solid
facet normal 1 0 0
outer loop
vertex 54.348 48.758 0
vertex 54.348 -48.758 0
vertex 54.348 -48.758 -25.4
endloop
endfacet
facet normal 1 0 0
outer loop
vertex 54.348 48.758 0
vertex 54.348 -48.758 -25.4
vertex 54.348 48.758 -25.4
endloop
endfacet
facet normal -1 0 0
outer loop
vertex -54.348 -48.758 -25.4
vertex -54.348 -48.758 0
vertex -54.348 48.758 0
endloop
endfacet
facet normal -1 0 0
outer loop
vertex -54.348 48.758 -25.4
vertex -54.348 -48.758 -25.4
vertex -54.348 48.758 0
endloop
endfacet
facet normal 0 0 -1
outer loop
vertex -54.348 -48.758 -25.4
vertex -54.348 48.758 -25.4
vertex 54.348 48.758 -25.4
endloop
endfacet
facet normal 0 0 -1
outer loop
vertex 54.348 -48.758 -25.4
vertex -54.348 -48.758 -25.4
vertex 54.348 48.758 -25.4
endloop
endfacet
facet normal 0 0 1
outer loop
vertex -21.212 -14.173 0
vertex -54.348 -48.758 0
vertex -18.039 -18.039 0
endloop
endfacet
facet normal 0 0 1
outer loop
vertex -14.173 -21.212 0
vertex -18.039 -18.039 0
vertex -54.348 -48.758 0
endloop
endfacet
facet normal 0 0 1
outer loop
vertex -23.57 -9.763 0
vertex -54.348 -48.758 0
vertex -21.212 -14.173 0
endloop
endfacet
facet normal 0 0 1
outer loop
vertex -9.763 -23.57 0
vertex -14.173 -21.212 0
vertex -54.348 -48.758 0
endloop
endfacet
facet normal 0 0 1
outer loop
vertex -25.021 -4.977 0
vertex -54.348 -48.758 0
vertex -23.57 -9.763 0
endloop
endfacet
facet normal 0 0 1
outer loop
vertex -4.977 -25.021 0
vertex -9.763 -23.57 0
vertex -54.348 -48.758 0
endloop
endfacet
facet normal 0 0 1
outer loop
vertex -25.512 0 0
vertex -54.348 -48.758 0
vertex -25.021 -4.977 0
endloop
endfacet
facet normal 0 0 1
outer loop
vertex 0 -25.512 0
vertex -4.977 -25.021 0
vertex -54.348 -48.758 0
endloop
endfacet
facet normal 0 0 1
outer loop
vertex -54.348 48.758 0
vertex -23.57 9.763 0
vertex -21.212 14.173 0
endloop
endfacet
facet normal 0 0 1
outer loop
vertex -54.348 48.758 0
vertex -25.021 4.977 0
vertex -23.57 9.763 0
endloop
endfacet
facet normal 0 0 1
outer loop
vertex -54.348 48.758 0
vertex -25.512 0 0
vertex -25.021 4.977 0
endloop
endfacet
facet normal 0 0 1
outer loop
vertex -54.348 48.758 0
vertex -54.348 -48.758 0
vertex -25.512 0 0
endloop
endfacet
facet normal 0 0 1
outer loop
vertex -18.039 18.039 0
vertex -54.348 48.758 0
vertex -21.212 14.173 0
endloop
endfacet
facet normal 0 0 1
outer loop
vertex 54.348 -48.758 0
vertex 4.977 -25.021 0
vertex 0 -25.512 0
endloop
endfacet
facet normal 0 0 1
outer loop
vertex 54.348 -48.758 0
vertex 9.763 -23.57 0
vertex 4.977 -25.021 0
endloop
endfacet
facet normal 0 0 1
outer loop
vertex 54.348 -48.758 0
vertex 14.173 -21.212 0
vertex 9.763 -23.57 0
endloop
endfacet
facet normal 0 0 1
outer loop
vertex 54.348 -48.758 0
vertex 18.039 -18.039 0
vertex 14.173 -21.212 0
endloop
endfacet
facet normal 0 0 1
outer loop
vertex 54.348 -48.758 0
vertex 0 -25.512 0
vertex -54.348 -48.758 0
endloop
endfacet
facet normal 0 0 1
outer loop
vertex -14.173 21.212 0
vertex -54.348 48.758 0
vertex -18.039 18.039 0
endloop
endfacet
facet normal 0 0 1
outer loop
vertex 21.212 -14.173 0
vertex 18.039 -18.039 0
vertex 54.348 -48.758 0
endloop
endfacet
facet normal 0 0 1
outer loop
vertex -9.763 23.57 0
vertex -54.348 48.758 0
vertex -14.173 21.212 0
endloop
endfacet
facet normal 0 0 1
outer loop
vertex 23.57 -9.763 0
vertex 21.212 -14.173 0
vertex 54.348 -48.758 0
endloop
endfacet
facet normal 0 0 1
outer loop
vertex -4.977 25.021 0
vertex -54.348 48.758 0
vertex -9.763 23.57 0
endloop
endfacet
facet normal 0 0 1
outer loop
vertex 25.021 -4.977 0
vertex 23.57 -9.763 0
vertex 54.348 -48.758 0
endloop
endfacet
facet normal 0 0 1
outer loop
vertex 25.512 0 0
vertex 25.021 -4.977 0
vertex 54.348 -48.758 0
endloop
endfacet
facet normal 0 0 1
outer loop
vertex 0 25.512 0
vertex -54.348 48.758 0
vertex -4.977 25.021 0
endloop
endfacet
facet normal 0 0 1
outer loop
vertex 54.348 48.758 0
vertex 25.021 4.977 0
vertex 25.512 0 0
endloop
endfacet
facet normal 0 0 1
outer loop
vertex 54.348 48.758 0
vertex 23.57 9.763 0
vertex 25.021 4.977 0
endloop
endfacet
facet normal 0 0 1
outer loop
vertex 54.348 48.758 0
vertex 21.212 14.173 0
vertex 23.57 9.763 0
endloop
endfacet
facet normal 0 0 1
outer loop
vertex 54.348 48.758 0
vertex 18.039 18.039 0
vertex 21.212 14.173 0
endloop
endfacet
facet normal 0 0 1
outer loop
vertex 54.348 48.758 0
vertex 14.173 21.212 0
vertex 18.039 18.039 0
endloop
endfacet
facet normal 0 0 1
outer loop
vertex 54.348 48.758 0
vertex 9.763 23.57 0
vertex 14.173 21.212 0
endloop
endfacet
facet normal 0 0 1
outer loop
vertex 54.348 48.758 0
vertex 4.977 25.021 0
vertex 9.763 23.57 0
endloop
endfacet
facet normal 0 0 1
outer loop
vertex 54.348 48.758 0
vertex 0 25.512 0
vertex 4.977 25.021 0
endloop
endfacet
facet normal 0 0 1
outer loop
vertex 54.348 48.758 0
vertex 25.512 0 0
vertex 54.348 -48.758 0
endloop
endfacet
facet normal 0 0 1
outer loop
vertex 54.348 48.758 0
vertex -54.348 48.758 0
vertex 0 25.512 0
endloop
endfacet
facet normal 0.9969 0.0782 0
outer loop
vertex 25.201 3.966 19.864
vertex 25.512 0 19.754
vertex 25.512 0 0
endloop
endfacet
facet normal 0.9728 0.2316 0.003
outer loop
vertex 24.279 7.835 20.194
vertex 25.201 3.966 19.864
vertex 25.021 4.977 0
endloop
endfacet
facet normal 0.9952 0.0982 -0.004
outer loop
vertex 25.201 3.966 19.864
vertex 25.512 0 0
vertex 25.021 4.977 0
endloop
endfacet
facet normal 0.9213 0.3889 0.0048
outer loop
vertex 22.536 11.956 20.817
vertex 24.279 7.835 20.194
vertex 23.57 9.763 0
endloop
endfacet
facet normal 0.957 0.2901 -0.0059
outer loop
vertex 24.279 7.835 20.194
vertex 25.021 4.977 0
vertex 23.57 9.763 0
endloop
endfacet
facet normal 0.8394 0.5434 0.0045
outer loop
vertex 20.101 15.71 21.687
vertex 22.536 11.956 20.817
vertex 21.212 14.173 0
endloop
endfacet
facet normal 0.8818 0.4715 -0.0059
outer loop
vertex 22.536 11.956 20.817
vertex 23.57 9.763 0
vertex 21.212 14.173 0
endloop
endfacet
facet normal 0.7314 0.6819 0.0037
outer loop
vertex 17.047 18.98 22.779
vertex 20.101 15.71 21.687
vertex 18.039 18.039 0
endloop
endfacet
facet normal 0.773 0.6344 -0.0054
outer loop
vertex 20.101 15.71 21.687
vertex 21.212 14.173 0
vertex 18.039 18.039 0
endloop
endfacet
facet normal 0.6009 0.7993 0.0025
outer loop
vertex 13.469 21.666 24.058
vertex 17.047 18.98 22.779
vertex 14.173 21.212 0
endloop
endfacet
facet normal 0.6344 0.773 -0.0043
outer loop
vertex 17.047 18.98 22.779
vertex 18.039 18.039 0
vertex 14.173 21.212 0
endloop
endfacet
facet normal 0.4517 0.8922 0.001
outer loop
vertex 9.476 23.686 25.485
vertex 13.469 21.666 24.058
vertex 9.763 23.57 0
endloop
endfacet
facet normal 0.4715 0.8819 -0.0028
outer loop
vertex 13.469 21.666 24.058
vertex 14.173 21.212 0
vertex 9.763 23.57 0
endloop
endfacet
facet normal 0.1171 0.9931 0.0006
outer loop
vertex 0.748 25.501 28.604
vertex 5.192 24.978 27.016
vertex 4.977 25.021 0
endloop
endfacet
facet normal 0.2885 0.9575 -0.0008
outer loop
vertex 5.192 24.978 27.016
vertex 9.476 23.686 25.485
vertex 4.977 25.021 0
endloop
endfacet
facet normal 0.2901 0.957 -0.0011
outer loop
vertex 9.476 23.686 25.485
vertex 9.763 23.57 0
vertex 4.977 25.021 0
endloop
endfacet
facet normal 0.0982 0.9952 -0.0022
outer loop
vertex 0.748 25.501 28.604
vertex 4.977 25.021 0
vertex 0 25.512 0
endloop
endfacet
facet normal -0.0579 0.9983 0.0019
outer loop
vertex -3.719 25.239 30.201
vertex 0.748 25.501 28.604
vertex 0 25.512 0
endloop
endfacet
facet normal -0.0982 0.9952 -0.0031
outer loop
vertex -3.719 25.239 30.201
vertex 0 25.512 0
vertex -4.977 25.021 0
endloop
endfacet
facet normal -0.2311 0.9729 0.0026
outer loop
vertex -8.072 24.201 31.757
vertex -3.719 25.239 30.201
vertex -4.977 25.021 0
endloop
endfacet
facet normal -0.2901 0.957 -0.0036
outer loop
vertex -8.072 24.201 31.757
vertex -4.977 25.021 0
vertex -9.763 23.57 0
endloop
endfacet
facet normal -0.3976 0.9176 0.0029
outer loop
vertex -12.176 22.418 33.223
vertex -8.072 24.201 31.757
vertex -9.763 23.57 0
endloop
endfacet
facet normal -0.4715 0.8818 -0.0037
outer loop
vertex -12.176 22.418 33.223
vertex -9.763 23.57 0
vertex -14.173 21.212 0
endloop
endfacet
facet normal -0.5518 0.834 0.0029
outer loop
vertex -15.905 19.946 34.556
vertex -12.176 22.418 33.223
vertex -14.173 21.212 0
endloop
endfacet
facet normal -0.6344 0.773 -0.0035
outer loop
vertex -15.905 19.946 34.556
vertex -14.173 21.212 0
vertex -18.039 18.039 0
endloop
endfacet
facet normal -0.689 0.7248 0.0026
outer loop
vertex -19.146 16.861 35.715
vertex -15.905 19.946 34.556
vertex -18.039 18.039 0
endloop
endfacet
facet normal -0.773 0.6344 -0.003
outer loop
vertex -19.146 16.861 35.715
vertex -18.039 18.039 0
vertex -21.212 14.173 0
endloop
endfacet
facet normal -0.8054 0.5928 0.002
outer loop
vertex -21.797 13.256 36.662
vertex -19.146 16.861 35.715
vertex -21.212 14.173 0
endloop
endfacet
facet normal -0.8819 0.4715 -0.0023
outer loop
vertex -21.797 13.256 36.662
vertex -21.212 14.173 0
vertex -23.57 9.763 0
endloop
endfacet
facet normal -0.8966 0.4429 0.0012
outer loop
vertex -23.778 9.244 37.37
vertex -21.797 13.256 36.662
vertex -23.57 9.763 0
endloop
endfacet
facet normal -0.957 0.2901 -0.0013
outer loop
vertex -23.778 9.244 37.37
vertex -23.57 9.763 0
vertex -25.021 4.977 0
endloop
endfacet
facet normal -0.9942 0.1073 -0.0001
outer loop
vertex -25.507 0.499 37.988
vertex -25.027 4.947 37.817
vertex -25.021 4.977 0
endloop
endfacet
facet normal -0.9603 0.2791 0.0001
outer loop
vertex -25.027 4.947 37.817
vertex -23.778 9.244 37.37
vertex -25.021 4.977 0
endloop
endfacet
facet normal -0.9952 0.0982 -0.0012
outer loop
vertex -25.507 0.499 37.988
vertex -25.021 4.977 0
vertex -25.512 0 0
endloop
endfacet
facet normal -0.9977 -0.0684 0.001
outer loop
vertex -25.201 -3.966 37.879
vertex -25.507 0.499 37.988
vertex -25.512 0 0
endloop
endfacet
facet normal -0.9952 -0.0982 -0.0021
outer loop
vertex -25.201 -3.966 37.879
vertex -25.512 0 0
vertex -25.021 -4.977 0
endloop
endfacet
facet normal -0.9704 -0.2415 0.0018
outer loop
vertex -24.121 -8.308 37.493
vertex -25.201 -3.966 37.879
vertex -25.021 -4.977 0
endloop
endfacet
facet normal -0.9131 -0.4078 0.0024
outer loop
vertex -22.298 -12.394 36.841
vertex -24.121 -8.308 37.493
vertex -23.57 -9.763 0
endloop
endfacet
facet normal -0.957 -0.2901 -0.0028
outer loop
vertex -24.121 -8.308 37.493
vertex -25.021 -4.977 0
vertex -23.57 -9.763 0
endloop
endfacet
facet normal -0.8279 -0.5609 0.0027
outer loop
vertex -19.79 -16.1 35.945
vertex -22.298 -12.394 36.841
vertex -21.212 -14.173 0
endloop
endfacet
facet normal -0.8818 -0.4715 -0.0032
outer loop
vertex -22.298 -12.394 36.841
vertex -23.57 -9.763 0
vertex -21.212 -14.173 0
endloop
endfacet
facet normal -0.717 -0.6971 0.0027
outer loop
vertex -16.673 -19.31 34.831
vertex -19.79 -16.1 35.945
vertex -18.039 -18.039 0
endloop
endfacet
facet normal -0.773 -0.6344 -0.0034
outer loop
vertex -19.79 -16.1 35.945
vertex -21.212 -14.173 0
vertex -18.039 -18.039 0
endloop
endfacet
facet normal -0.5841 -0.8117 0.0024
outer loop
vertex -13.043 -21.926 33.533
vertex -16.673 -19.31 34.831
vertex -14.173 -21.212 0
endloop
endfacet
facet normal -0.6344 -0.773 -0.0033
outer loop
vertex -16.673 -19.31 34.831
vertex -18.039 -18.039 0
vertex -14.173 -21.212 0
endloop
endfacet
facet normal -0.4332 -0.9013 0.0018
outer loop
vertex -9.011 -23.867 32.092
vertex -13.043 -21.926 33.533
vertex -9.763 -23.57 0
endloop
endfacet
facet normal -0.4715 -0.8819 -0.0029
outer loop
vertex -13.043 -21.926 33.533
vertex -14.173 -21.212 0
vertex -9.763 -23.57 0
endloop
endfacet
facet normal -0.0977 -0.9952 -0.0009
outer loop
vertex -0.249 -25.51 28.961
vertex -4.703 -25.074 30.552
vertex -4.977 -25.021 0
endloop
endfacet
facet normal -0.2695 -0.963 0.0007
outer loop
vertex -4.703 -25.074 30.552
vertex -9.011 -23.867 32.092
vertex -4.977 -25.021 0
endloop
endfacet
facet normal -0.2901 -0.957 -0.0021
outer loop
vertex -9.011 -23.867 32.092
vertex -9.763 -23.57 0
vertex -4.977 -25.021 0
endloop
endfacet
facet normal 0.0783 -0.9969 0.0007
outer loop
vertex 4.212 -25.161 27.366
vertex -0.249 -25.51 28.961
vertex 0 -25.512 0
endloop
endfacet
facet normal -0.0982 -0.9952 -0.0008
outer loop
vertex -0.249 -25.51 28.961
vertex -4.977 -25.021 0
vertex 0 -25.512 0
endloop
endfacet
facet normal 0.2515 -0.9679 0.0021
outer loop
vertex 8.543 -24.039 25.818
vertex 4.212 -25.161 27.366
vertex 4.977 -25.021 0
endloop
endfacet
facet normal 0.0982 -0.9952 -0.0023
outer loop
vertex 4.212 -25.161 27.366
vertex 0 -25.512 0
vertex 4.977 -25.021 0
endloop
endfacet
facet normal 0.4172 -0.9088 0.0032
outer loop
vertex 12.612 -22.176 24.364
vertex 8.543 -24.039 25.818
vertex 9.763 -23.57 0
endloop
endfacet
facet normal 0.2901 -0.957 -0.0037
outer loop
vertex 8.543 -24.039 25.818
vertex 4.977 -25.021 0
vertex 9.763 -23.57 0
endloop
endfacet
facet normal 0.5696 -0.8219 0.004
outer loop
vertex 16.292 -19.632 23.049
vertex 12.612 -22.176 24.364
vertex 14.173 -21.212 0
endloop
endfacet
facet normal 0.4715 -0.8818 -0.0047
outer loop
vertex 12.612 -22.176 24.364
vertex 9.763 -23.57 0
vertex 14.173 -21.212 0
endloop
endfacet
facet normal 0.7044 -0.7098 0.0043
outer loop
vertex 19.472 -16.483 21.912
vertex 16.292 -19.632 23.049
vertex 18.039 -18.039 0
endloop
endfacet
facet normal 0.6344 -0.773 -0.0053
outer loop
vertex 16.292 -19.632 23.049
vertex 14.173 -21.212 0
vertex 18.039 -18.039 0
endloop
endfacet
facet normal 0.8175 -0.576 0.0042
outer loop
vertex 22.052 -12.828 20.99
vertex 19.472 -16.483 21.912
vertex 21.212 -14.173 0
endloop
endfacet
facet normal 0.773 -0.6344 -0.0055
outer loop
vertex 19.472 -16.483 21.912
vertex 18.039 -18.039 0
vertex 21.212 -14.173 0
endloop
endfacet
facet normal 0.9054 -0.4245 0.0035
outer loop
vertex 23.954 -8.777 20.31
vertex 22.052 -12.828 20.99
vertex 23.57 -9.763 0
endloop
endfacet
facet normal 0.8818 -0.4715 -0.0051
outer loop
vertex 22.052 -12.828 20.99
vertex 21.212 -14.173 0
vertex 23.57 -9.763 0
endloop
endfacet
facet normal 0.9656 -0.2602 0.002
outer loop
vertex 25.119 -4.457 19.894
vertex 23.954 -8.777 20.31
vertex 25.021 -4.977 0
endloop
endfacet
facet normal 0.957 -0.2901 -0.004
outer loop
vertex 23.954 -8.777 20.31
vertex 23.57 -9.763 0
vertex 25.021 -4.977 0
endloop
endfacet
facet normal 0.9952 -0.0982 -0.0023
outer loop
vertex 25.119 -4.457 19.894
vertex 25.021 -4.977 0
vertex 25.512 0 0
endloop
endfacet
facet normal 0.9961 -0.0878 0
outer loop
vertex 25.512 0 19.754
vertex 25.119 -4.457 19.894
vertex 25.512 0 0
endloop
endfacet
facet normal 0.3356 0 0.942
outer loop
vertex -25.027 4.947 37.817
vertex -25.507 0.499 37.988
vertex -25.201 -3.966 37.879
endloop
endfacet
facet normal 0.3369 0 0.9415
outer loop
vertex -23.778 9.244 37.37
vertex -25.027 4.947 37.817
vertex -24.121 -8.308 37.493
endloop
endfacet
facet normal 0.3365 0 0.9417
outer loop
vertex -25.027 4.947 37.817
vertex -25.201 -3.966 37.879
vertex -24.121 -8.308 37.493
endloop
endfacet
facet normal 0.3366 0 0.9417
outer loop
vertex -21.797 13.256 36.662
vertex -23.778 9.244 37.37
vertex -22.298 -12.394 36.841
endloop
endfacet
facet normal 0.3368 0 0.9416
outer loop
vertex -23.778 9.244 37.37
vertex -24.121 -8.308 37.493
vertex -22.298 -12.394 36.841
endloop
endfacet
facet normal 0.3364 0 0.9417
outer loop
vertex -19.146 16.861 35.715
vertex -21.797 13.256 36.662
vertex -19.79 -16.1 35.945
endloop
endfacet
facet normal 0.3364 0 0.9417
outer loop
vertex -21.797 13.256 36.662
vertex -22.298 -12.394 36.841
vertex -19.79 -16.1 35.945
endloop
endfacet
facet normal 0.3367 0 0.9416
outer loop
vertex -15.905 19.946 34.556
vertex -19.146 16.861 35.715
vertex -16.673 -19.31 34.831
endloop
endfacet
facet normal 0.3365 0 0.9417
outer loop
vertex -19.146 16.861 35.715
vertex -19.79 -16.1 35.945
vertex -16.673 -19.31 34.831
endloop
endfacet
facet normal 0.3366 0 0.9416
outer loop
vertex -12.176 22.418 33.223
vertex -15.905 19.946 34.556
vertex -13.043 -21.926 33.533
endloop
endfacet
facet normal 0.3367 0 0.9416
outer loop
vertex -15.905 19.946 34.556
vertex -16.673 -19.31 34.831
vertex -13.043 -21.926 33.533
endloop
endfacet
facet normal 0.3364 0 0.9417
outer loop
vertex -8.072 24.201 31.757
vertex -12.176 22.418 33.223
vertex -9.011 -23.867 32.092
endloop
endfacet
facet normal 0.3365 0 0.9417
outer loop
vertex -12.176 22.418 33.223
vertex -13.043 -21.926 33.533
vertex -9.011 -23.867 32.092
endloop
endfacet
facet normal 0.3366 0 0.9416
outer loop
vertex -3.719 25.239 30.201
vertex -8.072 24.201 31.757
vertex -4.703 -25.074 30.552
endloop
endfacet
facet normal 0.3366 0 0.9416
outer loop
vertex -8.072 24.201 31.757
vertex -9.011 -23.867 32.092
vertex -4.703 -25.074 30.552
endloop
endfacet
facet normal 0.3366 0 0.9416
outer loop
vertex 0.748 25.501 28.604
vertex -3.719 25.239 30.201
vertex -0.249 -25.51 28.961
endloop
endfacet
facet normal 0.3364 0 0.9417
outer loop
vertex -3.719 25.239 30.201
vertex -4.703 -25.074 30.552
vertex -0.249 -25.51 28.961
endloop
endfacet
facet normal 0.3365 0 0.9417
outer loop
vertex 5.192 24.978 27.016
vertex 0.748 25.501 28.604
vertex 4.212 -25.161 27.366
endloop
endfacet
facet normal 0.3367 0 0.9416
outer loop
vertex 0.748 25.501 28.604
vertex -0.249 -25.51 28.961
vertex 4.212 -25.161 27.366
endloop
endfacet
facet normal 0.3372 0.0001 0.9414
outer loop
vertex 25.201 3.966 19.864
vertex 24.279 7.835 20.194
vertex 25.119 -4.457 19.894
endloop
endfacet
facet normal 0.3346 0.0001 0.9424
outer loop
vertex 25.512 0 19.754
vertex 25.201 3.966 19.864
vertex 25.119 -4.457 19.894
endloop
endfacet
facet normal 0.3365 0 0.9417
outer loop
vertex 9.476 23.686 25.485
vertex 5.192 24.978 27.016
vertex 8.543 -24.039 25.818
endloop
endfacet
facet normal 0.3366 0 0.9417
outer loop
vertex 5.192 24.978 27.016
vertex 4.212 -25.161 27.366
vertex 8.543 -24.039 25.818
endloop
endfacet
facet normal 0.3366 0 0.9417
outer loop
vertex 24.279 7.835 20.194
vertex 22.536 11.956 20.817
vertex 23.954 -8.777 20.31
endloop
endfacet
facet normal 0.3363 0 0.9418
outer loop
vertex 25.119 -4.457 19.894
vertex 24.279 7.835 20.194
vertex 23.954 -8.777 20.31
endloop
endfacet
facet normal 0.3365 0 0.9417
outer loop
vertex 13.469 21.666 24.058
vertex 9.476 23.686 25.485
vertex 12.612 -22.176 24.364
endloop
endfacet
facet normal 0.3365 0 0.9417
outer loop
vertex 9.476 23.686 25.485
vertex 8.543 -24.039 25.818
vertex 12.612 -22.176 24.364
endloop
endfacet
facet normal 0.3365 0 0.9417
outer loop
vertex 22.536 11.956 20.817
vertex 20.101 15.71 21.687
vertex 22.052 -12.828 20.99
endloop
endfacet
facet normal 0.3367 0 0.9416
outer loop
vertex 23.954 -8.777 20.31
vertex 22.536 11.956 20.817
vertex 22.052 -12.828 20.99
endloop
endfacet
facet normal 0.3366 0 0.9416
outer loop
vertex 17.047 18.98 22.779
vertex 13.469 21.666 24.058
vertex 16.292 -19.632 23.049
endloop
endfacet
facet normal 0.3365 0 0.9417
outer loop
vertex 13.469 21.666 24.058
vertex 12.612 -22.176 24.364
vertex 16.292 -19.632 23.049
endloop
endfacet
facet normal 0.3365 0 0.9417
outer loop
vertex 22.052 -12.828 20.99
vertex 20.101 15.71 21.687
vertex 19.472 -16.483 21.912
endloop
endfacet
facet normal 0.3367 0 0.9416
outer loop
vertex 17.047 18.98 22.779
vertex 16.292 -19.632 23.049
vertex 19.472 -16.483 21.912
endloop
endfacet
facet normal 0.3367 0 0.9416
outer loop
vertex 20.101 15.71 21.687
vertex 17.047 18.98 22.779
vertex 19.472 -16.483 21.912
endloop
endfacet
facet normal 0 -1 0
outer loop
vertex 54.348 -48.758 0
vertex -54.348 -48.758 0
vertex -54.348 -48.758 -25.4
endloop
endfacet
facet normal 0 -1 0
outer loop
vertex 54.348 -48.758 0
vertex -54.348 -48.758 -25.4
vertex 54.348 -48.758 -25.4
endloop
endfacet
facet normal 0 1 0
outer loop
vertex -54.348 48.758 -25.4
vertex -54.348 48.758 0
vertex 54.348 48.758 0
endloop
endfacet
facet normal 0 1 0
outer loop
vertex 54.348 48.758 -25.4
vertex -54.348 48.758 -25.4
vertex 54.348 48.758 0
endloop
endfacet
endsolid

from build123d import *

# Parameters (mm, degrees)
F0_W     = 108.696282
F0_H     = 97.515046
F1_DEPTH = 25.4
F2_R     = 25.511532
F3_DEPTH = 38.1
F5_DEPTH = 63.5


with BuildPart() as f1:
    # F0 (on Top) → F1 (new body)
    with BuildSketch(Plane.XY):
        Rectangle(F0_W, F0_H)
    extrude(amount=-F1_DEPTH)

    # F2 (on Top) → F3 (join)
    with BuildSketch(Plane.XY):
        Circle(F2_R)
    extrude(amount=F3_DEPTH)

    # F4 (on Front) → F5 (cut, symmetric)
    with BuildSketch(Plane.XZ):
        Polygon((25.862852, 41.473117), (-35.257578, 41.473117), (25.597604, 19.722745), align=None)
    extrude(amount=F5_DEPTH, both=True, mode=Mode.SUBTRACT)


solid = f1.part
